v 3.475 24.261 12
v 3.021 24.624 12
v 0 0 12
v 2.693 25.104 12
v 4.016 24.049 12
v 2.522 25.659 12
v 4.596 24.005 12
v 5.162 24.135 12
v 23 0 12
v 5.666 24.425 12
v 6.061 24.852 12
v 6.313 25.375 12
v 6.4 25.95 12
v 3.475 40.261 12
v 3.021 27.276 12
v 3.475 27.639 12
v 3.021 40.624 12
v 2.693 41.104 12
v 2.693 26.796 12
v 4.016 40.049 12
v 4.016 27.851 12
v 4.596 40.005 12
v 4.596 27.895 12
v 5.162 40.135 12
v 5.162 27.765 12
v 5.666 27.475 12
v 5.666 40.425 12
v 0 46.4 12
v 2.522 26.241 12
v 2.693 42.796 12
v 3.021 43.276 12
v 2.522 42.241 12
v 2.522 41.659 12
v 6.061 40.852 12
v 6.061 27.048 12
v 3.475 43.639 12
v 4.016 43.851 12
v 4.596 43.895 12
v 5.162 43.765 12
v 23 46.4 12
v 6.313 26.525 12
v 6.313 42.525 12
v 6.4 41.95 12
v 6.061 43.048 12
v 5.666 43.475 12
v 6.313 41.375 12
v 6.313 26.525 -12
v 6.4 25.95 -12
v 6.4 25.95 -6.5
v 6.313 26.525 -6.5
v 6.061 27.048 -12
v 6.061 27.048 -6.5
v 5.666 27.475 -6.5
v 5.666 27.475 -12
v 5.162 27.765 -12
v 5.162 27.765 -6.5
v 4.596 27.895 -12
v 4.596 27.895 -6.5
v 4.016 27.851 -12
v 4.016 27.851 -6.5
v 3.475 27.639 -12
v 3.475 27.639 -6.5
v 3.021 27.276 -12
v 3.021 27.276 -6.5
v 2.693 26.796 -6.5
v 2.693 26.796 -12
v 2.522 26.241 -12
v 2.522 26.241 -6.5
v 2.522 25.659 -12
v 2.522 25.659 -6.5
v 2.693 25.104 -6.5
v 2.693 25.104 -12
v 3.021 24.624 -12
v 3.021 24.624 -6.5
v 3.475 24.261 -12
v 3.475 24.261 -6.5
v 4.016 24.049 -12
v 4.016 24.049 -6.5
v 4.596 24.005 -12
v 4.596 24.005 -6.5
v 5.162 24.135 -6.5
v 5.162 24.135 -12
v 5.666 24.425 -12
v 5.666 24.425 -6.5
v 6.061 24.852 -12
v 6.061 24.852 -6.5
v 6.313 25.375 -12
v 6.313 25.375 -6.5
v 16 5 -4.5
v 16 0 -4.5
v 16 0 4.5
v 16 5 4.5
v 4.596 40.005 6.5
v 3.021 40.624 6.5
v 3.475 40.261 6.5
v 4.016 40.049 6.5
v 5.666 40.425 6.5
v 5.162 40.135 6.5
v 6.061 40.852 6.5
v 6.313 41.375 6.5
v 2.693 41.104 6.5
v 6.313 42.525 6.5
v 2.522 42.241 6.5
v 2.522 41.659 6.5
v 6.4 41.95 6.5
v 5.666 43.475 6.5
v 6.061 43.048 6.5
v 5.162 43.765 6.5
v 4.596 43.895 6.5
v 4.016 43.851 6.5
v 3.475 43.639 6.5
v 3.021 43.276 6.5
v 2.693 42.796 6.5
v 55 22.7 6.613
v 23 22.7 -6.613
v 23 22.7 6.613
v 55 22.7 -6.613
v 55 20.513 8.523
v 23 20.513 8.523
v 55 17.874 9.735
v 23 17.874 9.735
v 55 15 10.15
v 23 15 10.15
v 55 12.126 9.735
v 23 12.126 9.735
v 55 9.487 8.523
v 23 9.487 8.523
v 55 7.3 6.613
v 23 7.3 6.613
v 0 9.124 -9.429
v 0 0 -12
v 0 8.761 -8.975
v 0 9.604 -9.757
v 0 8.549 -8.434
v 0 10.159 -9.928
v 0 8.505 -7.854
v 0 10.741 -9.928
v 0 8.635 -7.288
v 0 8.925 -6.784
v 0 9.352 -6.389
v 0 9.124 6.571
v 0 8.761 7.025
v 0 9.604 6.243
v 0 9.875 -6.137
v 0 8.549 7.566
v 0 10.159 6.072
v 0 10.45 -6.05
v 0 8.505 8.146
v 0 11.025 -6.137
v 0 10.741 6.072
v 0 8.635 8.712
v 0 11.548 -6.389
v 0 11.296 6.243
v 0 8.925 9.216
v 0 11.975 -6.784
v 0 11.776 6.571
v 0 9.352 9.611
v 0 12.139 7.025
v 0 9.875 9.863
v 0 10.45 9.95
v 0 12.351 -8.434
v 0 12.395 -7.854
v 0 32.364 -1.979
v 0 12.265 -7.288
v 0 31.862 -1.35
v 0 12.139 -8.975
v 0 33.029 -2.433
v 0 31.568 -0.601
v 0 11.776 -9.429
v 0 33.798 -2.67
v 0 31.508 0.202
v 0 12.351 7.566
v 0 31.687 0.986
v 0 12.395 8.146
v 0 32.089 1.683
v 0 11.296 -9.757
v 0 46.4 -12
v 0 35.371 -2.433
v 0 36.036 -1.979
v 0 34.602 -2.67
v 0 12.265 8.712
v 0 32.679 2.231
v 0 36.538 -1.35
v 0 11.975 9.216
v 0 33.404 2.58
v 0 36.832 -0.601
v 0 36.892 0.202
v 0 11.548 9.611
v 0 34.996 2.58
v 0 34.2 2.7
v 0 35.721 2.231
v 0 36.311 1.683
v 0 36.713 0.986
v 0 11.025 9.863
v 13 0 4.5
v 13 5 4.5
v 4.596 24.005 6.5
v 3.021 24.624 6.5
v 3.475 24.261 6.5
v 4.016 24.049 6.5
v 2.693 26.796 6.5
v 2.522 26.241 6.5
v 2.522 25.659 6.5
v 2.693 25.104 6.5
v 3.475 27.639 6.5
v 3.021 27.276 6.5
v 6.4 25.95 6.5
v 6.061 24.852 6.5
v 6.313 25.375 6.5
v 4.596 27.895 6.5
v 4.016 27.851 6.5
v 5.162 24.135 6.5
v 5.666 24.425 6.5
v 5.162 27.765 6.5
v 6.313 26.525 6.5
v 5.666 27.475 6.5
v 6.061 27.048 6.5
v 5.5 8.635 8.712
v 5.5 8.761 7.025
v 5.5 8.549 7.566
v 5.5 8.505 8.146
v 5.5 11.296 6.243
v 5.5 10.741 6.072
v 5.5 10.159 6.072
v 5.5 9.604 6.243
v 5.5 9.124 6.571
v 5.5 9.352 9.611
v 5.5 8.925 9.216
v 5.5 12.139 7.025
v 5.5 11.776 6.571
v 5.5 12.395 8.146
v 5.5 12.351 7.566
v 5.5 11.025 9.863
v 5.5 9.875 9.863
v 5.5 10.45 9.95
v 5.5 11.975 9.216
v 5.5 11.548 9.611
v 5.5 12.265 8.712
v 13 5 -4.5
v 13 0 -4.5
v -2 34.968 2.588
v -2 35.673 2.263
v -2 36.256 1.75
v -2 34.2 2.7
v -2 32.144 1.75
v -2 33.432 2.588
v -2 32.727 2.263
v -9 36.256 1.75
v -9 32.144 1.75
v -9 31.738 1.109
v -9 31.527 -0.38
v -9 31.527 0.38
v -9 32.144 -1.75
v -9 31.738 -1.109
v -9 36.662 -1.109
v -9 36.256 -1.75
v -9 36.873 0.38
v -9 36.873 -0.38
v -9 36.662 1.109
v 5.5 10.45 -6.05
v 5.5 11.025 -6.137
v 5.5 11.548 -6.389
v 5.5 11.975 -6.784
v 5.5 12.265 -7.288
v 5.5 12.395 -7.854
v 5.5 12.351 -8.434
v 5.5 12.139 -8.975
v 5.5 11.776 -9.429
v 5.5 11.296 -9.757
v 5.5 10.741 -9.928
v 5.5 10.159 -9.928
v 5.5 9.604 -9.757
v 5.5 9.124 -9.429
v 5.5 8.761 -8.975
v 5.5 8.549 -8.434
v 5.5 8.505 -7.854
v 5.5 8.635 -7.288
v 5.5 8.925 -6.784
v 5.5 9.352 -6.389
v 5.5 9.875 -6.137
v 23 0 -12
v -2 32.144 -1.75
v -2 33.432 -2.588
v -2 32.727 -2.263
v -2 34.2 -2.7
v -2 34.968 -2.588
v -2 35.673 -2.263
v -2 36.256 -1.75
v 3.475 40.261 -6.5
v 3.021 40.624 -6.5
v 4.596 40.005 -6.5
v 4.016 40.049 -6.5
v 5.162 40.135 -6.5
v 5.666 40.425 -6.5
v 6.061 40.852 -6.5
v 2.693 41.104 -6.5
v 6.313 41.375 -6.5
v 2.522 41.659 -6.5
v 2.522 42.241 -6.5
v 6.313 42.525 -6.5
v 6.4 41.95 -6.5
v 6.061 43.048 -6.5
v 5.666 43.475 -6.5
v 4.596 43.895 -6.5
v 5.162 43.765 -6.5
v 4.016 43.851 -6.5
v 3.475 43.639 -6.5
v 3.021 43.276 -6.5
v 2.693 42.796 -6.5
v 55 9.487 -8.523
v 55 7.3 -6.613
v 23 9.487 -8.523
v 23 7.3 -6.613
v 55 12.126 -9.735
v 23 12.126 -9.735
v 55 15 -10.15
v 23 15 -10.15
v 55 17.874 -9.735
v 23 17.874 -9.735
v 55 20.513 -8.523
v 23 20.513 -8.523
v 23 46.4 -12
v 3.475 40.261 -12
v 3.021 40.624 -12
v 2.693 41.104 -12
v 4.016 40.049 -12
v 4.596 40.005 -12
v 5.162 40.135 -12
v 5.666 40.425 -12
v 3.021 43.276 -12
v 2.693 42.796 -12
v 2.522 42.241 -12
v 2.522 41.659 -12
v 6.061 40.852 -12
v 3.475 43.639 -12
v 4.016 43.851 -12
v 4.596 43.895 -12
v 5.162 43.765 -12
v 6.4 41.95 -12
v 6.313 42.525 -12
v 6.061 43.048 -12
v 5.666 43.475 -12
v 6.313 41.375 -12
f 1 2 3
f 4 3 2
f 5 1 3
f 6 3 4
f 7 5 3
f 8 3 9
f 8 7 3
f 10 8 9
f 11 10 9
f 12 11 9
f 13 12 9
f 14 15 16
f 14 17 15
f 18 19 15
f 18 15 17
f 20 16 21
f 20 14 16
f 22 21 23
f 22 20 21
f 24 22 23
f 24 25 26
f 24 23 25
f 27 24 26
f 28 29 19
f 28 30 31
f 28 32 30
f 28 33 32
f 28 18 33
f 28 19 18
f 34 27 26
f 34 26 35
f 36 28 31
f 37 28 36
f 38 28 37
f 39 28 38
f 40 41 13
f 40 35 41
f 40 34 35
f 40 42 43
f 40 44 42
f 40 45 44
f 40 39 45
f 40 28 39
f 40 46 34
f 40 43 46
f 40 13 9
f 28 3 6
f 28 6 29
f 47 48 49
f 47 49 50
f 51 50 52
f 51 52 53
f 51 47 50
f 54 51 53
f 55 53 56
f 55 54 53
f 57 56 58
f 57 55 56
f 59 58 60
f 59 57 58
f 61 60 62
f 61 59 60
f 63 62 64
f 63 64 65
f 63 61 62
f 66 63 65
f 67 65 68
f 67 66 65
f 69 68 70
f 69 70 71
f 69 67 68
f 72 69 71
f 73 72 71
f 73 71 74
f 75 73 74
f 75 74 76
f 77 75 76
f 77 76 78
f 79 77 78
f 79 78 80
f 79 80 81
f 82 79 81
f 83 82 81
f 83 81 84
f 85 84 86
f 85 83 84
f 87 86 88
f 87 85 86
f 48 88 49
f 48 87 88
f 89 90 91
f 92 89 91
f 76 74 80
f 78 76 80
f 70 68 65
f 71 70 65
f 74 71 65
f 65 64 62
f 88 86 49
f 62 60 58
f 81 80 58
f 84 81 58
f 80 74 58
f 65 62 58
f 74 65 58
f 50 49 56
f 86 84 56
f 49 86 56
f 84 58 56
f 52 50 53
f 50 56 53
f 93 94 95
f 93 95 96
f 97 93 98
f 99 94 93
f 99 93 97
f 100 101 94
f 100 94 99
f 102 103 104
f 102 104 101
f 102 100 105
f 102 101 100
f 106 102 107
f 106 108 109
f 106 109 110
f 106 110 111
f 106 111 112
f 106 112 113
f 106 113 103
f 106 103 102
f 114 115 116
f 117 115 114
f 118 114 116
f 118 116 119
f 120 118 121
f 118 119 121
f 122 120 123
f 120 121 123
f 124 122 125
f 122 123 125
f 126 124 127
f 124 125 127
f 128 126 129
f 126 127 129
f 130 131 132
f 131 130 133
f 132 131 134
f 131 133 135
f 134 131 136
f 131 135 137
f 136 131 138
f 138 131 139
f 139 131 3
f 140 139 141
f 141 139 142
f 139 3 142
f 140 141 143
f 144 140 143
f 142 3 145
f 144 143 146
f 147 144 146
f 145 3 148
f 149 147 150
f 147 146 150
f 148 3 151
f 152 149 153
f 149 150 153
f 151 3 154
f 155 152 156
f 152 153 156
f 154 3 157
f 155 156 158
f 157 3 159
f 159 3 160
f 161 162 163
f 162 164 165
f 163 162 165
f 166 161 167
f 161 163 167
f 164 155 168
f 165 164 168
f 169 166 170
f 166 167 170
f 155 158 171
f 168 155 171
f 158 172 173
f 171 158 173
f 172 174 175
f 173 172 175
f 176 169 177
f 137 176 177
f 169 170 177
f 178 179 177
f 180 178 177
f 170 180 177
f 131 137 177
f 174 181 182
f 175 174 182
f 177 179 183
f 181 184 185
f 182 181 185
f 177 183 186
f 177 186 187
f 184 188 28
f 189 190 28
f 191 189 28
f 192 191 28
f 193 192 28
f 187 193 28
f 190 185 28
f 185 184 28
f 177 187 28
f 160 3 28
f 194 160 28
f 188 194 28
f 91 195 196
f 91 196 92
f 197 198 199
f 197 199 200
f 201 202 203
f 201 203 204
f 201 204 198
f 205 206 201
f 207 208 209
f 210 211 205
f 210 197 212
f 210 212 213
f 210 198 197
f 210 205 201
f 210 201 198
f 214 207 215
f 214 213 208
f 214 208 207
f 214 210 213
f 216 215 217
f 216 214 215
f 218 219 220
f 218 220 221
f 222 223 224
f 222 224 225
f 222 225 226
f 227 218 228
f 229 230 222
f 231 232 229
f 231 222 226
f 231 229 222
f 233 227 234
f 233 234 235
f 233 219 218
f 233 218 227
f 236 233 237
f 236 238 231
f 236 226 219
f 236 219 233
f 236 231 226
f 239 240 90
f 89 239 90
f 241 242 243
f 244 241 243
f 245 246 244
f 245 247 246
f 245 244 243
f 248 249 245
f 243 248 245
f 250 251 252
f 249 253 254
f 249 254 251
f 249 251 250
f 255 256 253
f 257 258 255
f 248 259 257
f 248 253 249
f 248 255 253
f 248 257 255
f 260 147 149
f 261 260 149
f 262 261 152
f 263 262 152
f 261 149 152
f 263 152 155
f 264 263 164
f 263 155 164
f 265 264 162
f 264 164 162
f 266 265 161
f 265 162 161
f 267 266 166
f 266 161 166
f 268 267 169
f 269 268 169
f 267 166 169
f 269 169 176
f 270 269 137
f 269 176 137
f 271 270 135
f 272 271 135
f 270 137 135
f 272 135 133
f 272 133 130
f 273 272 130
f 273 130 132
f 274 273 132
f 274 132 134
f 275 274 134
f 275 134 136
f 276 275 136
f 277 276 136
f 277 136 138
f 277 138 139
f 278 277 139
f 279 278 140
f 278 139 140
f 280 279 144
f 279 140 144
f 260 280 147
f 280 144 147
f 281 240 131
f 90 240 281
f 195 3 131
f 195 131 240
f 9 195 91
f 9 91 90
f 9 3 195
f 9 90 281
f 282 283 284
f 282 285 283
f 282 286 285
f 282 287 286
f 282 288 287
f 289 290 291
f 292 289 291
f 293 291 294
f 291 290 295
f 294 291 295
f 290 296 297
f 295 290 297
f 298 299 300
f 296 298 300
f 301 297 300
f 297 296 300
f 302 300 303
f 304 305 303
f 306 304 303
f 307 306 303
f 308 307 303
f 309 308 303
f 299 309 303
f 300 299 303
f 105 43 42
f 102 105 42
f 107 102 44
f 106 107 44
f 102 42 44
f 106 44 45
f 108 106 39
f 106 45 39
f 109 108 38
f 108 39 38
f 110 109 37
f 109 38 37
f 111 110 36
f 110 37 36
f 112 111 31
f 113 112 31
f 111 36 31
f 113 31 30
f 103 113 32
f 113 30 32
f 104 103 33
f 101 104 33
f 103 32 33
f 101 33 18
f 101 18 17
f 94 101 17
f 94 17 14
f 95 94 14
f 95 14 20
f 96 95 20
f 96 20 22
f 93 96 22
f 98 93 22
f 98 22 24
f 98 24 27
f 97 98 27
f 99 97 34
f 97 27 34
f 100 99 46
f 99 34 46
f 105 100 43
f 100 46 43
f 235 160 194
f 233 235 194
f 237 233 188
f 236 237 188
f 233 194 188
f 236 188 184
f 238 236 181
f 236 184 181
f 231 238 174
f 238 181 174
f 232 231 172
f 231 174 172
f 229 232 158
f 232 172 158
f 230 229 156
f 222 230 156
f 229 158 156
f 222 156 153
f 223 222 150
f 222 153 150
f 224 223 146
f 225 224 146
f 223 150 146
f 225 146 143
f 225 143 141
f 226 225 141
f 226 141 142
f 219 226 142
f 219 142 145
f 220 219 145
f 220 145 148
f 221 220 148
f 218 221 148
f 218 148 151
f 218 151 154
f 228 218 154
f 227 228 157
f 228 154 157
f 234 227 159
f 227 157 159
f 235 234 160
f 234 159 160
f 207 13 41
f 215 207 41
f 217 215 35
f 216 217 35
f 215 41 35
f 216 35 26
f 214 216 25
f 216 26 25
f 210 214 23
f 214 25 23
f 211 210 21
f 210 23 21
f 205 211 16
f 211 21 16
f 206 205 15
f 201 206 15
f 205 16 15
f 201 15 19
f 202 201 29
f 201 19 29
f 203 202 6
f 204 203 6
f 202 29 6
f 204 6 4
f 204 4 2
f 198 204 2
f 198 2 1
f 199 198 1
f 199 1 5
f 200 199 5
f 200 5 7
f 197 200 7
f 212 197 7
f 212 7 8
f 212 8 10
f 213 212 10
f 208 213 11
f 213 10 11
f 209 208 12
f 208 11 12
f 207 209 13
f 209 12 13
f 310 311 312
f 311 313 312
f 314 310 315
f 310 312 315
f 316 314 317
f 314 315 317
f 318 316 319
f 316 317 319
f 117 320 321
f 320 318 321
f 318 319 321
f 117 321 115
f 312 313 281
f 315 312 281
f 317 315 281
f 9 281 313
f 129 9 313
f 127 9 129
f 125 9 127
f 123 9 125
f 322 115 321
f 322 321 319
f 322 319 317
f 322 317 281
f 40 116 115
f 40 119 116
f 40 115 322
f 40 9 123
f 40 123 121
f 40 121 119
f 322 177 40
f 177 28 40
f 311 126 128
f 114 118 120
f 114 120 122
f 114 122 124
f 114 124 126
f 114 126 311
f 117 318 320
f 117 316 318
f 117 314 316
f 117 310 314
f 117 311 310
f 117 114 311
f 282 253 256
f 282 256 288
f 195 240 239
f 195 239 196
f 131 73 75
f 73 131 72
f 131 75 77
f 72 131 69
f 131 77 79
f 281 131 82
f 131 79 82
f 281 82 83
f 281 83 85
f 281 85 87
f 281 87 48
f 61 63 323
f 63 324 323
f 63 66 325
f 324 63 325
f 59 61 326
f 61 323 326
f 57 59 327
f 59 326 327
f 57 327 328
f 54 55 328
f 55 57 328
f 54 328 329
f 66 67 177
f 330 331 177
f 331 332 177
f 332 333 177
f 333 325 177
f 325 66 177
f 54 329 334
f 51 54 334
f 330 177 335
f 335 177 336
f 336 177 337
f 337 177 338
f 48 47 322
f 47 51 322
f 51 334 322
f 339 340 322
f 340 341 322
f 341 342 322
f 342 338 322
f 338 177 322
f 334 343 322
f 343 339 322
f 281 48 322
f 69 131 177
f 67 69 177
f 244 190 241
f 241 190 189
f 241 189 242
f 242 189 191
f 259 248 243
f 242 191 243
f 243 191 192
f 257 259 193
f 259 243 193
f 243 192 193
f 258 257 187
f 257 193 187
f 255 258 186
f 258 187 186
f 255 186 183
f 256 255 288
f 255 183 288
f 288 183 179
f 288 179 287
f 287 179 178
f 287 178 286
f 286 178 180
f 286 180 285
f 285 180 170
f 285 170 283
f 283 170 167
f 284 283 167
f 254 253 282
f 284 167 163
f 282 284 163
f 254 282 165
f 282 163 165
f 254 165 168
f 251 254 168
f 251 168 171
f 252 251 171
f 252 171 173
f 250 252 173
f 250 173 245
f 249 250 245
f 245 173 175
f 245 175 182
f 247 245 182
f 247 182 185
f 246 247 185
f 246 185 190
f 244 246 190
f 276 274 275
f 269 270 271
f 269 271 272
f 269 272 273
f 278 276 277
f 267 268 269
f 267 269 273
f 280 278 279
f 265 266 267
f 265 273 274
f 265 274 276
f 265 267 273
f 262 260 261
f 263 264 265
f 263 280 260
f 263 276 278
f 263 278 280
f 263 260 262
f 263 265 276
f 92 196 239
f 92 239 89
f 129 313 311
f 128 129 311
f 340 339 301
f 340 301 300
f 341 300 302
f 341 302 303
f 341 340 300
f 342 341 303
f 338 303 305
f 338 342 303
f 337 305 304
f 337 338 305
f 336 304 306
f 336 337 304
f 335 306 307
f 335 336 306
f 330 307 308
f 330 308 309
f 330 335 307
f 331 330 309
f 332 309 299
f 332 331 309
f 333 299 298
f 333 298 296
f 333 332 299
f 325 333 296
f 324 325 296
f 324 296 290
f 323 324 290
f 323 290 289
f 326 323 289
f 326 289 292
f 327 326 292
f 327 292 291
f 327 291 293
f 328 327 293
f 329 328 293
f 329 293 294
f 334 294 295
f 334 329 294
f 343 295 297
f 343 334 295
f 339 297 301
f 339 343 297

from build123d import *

# Parameters (mm, degrees)
SKETCH1_W               = 23
SKETCH1_H               = 46.4
BOSS_EXTRUDE1_DEPTH     = 12
SKETCH6_R               = 1.95
CUT_EXTRUDE1_DEPTH      = 5.5
SKETCH7_R               = 2.7
BOSS_EXTRUDE2_DEPTH     = 9
SKETCH8_W               = 7
SKETCH8_H               = 0.95
CUT_EXTRUDE2_DEPTH      = 47.4
SKETCH9_R               = 1.95
CUT_EXTRUDE3_DEPTH      = 5.5
SKETCH10_R              = 10.15
BOSS_EXTRUDE3_DEPTH     = 32
SKETCH11_W              = 32
SKETCH11_H              = 2.45
CUT_EXTRUDE4_DEPTH      = 13
CUT_EXTRUDE4_DEPTH_BACK = 13
SKETCH12_W              = 3
SKETCH12_H              = 9
CUT_EXTRUDE5_DEPTH      = 5


with BuildPart() as part:
    # Sketch1 → Boss-Extrude1 (new body, symmetric)
    with BuildSketch(Plane.XY):
        with Locations((11.5, 23.2)):
            Rectangle(SKETCH1_W, SKETCH1_H)
    extrude(amount=BOSS_EXTRUDE1_DEPTH, both=True)

    # Sketch6 → Cut-Extrude1 (cut)
    with BuildSketch(Plane.XY.offset(12)):
        with Locations((4.45, 41.95)):
            Circle(SKETCH6_R)
        with Locations((4.45, 25.95)):
            Circle(SKETCH6_R)
    cut_extrude1 = extrude(amount=-CUT_EXTRUDE1_DEPTH, mode=Mode.SUBTRACT)

    # Mirror1: Cut-Extrude1 across plane
    add(cut_extrude1.mirror(Plane.XY), mode=Mode.SUBTRACT)

    # Sketch7 → Boss-Extrude2 (add)
    with BuildSketch(Plane.ZY):
        with Locations((0, 34.2)):
            Circle(SKETCH7_R)
    extrude(amount=BOSS_EXTRUDE2_DEPTH)

    # Sketch8 → Cut-Extrude2 (cut, through all)
    with BuildSketch(Plane(origin=(0, 0, 0), x_dir=(1, 0, 0), z_dir=(0, 1, 0))):
        with Locations((-5.5, 2.225)):
            Rectangle(SKETCH8_W, SKETCH8_H)
        with Locations((-5.5, -2.225)):
            Rectangle(SKETCH8_W, SKETCH8_H)
    extrude(amount=CUT_EXTRUDE2_DEPTH, mode=Mode.SUBTRACT)

    # Sketch9 → Cut-Extrude3 (cut)
    with BuildSketch(Plane.ZY):
        with Locations((-8, 10.45)):
            Circle(SKETCH9_R)
        with Locations((8, 10.45)):
            Circle(SKETCH9_R)
    extrude(amount=-CUT_EXTRUDE3_DEPTH, mode=Mode.SUBTRACT)

    # Sketch10 → Boss-Extrude3 (add)
    with BuildSketch(Plane(origin=(23, 0, 0), x_dir=(0, 0, -1), z_dir=(1, 0, 0))):
        with Locations((0, 15)):
            Circle(SKETCH10_R)
    extrude(amount=BOSS_EXTRUDE3_DEPTH)

    # Sketch11 → Cut-Extrude4 (cut, two sides)
    with BuildSketch(Plane.XY) as cut_extrude4_sk:
        with Locations((39, 23.925)):
            Rectangle(SKETCH11_W, SKETCH11_H)
        with Locations((39, 6.075)):
            Rectangle(SKETCH11_W, SKETCH11_H)
    extrude(amount=CUT_EXTRUDE4_DEPTH, mode=Mode.SUBTRACT)
    extrude(cut_extrude4_sk.sketch, amount=-CUT_EXTRUDE4_DEPTH_BACK, mode=Mode.SUBTRACT)

    # Sketch12 → Cut-Extrude5 (cut)
    with BuildSketch(Plane.XZ):
        with Locations((14.5, 0)):
            Rectangle(SKETCH12_W, SKETCH12_H)
    extrude(amount=-CUT_EXTRUDE5_DEPTH, mode=Mode.SUBTRACT)


solid = part.part
